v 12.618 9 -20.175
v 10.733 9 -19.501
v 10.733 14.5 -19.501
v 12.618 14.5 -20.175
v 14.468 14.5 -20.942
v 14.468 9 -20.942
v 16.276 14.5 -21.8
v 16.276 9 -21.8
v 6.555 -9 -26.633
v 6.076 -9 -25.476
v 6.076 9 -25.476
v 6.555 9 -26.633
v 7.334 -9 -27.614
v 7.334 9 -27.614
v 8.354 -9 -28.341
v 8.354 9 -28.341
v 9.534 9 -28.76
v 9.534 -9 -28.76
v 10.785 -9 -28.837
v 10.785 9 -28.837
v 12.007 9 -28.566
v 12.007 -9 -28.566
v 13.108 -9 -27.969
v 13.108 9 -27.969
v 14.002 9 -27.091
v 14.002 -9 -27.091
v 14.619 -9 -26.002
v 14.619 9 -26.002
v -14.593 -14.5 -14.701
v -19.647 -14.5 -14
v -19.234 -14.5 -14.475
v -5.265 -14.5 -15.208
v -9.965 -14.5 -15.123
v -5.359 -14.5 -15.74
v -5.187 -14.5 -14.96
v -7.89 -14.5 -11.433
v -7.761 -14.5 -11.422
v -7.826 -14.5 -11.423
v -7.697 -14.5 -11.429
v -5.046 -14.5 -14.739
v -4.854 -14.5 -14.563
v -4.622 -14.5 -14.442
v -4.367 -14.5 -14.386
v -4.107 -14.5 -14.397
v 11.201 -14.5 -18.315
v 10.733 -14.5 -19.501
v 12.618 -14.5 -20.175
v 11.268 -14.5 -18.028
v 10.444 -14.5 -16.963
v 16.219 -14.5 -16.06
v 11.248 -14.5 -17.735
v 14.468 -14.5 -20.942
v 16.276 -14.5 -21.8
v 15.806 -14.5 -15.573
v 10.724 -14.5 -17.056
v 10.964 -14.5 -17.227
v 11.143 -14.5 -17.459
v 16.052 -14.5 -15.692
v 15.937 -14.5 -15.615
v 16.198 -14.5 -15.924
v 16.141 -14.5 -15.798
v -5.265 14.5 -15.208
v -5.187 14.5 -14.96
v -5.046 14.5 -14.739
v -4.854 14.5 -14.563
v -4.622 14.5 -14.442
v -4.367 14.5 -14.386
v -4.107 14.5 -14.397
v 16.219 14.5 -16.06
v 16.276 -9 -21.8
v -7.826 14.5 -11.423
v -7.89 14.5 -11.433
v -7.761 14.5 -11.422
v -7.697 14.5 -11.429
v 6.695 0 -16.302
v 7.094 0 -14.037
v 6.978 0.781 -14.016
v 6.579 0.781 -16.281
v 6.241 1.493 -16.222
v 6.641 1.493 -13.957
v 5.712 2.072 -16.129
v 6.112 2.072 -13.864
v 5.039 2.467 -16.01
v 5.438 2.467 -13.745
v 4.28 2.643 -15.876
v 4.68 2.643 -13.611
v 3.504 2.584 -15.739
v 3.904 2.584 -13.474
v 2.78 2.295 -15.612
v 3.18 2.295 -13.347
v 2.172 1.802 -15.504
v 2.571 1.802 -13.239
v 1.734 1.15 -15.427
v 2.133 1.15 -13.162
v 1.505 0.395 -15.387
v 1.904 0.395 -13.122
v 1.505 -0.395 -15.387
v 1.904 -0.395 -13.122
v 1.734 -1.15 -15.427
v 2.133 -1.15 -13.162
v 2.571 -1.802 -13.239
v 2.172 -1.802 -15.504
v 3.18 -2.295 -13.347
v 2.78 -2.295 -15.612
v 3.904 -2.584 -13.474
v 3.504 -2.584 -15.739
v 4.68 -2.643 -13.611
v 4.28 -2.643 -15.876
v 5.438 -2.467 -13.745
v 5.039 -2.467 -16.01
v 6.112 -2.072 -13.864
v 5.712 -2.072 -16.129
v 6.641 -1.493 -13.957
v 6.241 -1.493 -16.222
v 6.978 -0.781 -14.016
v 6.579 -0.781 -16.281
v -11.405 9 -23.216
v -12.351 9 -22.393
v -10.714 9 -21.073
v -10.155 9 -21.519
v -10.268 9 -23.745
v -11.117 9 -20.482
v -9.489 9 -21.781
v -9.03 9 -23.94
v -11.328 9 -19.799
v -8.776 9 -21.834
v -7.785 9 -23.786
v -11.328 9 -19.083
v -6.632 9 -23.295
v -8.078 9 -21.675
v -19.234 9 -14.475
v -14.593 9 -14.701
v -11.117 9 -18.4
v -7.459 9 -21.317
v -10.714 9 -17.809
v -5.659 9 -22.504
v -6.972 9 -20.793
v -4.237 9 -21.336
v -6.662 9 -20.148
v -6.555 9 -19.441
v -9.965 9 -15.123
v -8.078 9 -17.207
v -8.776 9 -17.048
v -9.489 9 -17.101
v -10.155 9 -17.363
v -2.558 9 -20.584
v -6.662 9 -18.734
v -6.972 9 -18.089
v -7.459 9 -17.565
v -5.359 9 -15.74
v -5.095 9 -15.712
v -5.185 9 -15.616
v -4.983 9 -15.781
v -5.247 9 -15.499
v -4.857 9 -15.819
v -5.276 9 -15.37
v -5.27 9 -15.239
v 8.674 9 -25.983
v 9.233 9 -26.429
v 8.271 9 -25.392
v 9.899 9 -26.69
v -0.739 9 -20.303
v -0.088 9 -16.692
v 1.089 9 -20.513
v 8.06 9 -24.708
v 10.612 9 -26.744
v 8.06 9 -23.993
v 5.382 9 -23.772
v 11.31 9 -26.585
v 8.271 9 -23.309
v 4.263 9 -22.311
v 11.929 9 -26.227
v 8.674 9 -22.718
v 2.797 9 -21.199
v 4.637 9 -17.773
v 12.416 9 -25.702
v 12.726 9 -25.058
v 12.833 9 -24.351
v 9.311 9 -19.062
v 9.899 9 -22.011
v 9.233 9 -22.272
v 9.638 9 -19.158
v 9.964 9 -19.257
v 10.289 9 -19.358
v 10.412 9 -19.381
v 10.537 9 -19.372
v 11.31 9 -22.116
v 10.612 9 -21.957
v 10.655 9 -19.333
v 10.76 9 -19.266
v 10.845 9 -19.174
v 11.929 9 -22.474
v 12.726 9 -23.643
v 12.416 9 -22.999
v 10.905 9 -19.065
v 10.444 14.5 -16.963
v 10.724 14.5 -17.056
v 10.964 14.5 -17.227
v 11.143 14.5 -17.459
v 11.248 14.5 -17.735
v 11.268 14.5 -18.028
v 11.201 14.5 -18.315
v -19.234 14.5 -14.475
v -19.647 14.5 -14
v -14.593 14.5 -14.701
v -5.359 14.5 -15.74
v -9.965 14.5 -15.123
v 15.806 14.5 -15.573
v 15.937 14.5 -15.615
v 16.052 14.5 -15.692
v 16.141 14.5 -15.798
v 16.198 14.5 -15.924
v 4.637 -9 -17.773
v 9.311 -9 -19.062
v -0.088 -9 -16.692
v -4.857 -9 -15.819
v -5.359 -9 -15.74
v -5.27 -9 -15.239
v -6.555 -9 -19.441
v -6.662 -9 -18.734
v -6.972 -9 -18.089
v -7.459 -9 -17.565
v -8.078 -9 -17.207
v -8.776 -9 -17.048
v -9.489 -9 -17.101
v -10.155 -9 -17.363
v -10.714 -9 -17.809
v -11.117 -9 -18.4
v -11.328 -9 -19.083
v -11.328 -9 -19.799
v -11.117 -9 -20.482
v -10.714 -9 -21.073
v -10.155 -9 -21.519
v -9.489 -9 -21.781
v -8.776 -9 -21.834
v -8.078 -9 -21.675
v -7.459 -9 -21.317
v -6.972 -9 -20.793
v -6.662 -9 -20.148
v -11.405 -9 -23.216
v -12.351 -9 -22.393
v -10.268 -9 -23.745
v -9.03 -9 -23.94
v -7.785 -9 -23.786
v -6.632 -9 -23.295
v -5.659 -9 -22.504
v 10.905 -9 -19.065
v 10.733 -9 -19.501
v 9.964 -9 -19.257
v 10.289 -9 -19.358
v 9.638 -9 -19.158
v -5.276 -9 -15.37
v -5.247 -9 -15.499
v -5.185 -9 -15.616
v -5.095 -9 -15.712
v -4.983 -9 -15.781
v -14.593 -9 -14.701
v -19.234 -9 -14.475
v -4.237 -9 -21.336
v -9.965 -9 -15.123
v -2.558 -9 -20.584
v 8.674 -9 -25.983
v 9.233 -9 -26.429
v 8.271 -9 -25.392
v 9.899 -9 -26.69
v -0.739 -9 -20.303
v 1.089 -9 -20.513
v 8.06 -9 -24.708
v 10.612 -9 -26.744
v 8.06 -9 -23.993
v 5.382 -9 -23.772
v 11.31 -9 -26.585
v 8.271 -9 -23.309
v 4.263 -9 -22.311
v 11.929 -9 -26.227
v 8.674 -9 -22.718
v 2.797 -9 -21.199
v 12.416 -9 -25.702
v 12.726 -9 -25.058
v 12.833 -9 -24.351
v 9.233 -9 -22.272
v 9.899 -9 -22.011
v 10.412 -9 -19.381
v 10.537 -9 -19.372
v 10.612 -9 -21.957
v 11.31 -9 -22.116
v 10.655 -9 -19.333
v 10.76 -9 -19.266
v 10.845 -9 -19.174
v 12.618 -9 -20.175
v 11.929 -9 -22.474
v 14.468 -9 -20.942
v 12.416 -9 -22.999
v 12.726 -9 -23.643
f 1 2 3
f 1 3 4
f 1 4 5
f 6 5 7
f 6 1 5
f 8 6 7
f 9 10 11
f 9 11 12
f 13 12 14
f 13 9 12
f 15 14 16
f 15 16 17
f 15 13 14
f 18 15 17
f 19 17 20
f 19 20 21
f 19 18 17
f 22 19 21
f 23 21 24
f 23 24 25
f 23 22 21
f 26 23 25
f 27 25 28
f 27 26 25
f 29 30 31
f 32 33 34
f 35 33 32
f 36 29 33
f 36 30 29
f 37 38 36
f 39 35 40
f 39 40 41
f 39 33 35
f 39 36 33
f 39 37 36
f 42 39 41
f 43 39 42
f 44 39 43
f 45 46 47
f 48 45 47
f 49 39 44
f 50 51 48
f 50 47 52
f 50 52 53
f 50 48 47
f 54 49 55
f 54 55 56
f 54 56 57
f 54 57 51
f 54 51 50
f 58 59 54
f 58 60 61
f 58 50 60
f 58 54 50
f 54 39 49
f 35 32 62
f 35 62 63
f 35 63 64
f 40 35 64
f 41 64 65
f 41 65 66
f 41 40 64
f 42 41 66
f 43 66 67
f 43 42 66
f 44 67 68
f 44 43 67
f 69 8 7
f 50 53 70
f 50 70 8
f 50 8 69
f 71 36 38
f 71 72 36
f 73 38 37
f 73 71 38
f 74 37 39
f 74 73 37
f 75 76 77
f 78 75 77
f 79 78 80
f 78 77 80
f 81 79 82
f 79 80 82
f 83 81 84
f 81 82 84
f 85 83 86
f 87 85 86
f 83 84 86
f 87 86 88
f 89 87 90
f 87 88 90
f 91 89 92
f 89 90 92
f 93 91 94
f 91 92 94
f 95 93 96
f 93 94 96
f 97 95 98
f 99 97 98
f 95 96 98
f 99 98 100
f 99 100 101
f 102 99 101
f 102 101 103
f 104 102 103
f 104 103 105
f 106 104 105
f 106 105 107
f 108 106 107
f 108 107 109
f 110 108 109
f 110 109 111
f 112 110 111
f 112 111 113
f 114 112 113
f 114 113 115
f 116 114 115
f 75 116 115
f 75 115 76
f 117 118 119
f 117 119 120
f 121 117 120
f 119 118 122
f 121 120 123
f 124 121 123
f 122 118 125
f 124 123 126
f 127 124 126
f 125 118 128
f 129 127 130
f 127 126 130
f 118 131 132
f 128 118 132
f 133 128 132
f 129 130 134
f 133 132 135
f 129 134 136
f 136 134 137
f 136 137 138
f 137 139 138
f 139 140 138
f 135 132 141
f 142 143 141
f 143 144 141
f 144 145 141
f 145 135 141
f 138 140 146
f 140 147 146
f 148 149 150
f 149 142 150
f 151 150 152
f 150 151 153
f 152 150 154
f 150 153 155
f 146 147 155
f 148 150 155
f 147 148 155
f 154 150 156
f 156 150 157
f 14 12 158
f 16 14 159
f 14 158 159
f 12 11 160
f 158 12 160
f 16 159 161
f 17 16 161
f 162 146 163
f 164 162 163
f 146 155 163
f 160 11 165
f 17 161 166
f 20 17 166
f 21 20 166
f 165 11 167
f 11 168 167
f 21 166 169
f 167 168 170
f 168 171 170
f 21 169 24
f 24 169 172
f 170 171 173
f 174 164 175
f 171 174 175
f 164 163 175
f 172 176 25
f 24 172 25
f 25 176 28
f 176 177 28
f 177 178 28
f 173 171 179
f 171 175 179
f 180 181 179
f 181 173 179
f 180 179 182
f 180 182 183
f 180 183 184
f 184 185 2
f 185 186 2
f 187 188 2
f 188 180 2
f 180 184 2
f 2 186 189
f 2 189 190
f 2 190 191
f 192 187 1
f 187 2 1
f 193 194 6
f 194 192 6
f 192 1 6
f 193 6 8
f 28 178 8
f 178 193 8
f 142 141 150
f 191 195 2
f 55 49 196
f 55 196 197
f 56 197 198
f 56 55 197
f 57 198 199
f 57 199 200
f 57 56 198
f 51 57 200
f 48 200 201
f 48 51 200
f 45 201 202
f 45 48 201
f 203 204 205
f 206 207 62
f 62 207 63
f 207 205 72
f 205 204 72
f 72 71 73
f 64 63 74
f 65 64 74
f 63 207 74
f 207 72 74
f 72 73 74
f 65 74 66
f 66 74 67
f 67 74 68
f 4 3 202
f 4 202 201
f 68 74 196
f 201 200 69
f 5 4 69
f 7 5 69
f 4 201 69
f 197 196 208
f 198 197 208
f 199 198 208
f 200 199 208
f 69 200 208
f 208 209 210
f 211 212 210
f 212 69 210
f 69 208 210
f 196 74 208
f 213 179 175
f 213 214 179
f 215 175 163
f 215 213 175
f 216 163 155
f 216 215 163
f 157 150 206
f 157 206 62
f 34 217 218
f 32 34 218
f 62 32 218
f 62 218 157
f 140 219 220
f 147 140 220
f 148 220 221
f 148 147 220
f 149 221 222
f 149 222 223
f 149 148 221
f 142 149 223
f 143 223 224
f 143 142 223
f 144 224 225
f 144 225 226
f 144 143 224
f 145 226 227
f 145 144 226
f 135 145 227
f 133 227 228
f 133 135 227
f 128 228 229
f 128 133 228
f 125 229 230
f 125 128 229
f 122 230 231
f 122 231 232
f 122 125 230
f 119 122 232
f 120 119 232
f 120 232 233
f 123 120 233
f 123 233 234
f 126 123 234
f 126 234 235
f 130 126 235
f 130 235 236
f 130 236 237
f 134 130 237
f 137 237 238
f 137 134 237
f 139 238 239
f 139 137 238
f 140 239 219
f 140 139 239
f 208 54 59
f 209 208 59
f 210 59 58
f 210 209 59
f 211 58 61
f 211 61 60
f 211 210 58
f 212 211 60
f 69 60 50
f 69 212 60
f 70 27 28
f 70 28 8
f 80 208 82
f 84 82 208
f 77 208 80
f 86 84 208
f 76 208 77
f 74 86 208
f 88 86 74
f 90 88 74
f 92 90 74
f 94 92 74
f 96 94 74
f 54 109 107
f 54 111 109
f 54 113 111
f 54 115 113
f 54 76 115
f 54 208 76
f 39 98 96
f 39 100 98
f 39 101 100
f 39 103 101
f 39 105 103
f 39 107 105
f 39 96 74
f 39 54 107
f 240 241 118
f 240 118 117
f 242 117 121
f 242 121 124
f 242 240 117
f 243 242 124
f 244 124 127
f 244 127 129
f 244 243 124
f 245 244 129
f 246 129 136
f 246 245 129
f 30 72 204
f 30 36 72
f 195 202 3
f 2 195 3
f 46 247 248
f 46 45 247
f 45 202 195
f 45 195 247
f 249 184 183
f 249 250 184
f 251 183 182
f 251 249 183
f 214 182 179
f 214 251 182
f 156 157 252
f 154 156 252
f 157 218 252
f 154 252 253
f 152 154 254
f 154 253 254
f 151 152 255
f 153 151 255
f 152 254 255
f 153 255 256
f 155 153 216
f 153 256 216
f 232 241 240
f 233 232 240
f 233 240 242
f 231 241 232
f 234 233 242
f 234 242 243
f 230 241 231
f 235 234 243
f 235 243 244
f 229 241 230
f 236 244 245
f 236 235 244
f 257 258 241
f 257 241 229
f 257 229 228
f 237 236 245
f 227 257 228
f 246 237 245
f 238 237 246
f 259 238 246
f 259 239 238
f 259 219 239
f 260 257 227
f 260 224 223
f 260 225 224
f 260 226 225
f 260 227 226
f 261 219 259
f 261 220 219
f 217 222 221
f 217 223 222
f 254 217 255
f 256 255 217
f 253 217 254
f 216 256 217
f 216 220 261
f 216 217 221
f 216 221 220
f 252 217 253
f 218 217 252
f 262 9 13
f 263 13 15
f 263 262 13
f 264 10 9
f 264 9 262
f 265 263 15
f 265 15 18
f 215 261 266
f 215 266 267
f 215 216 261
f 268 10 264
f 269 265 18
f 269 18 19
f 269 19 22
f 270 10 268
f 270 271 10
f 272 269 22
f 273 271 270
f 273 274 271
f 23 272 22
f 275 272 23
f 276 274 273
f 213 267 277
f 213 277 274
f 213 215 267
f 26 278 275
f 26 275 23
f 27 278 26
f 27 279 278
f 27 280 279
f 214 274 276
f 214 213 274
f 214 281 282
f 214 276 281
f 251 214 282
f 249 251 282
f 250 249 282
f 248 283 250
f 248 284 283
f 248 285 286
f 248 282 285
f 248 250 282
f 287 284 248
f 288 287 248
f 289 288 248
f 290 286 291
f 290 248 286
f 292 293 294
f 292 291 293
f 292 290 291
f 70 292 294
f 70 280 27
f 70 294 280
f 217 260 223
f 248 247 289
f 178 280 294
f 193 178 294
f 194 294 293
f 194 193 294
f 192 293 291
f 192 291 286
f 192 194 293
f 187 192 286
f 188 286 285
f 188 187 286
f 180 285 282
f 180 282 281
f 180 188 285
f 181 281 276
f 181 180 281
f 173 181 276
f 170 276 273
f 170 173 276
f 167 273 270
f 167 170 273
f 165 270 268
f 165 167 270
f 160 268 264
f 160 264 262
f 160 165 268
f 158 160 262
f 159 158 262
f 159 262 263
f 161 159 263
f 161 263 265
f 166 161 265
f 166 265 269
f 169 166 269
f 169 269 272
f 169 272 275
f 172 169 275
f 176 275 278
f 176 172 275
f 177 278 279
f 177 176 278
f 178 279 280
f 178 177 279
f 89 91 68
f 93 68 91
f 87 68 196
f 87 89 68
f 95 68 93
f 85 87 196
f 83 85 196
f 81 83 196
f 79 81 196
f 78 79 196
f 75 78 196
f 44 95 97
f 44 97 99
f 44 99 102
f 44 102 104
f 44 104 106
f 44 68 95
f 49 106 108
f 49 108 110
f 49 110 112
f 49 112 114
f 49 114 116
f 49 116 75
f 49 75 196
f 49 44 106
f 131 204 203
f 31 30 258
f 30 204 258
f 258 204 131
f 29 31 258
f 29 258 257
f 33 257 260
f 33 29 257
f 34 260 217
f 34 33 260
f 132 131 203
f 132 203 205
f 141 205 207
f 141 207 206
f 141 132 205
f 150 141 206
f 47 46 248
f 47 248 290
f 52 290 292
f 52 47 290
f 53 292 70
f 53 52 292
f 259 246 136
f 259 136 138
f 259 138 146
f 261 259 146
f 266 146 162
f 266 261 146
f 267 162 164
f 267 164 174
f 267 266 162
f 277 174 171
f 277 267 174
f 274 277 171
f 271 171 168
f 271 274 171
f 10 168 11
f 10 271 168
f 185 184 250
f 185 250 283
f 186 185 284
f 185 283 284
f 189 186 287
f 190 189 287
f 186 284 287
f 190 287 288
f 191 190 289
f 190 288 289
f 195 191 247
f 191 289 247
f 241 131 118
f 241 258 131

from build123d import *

# Parameters (mm, degrees)
F0_R     = 2.4
F1_DEPTH = 9
F2_DEPTH = 14.5
F3_R     = 0.5
F4_R     = 2.65
F5_DEPTH = 3


# Not quite as in the source:
# - two fillets or chamfers of one size are made in one step


with BuildPart() as f1:
    # F0 (on Front) → F1 (new body, symmetric)
    with BuildSketch(Plane.XZ):
        with BuildLine():
            Line((-19.2344364101, -14.475), (-12.351193111, -22.3932656305))
            ThreePointArc((-12.351193111, -22.3932656305), (-9.0297827018, -23.9403785735), (-5.6587929287, -22.5044978281))
            ThreePointArc((-5.6587929287, -22.5044978281), (1.0891796651, -20.5129837703), (6.0760796929, -25.4760564557))
            ThreePointArc((6.0760796929, -25.4760564557), (10.1567684842, -28.8420423371), (14.6192295456, -26.0015629336))
            Line((14.6192295456, -26.0015629336), (16.2763282151, -21.8))
            ThreePointArc((16.2763282151, -21.8), (13.5478934476, -20.5465737293), (10.7331243144, -19.5013424519))
            ThreePointArc((10.7331243144, -19.5013424519), (10.0239485931, -19.2751816233), (9.3106871937, -19.0622565188))
            ThreePointArc((9.3106871937, -19.0622565188), (2.0328204041, -17.1501268195), (-5.3587456661, -15.740043125))
            ThreePointArc((-5.3587456661, -15.740043125), (-12.2765411998, -14.887603878), (-19.2344364101, -14.475))
        make_face()
        with Locations((10.4330504183, -24.3505316455)):
            Circle(F0_R, mode=Mode.SUBTRACT)
        with Locations((-8.955, -19.441)):
            Circle(F0_R, mode=Mode.SUBTRACT)
        with BuildLine():
            Line((-19.6473476105, -14), (-19.2344364101, -14.475))
            ThreePointArc((-19.2344364101, -14.475), (-12.2765411998, -14.887603878), (-5.3587456661, -15.740043125))
            Line((-5.3587456661, -15.740043125), (-5.2650160599, -15.2084761138))
            ThreePointArc((-5.2650160599, -15.2084761138), (-4.8537847433, -14.5629722472), (-4.1065601293, -14.3973165385))
            Line((-4.1065601293, -14.3973165385), (10.4444975606, -16.9630606071))
            ThreePointArc((10.4444975606, -16.9630606071), (11.1434489978, -17.4594321695), (11.2011114112, -18.3147642019))
            Line((11.2011114112, -18.3147642019), (10.7331243144, -19.5013424519))
            ThreePointArc((10.7331243144, -19.5013424519), (13.5478934476, -20.5465737293), (16.2763282151, -21.8))
            Line((16.2763282151, -21.8), (16.2145160132, -15.6449893321))
            Line((16.2145160132, -15.6449893321), (-7.7940477934, -11.4116317649))
            Line((-7.7940477934, -11.4116317649), (-19.6473476105, -14))
        make_face()
    extrude(amount=F1_DEPTH, both=True)

    # F0 (on Front) → F2 (join, symmetric)
    with BuildSketch(Plane.XZ):
        with BuildLine():
            Line((-19.6473476105, -14), (-19.2344364101, -14.475))
            ThreePointArc((-19.2344364101, -14.475), (-12.2765411998, -14.887603878), (-5.3587456661, -15.740043125))
            Line((-5.3587456661, -15.740043125), (-5.2650160599, -15.2084761138))
            ThreePointArc((-5.2650160599, -15.2084761138), (-4.8537847433, -14.5629722472), (-4.1065601293, -14.3973165385))
            Line((-4.1065601293, -14.3973165385), (10.4444975606, -16.9630606071))
            ThreePointArc((10.4444975606, -16.9630606071), (11.1434489978, -17.4594321695), (11.2011114112, -18.3147642019))
            Line((11.2011114112, -18.3147642019), (10.7331243144, -19.5013424519))
            ThreePointArc((10.7331243144, -19.5013424519), (13.5478934476, -20.5465737293), (16.2763282151, -21.8))
            Line((16.2763282151, -21.8), (16.2145160132, -15.6449893321))
            Line((16.2145160132, -15.6449893321), (-7.7940477934, -11.4116317649))
            Line((-7.7940477934, -11.4116317649), (-19.6473476105, -14))
        make_face()
    extrude(amount=F2_DEPTH, both=True)

    # F3
    f3_edges = [f1.edges().sort_by_distance(p)[0] for p in [
        (-5.358746, 0, -15.740043),
        (10.733124, 0, -19.501342),
        (16.214516, 0, -15.644989),
        (-7.794048, 0, -11.411632),
    ]]
    fillet(f3_edges, radius=F3_R)

    # F4 (on face) → F5 (cut)
    with BuildSketch(Plane(origin=(-2.1865232639, 0, -12.4003896345), x_dir=(0.984807753, 0, -0.1736481777), z_dir=(0.1736481777, 0, 0.984807753))):
        with Locations((6.7739703659, 0)):
            Circle(F4_R)
    extrude(amount=-F5_DEPTH, mode=Mode.SUBTRACT)


solid = f1.part
